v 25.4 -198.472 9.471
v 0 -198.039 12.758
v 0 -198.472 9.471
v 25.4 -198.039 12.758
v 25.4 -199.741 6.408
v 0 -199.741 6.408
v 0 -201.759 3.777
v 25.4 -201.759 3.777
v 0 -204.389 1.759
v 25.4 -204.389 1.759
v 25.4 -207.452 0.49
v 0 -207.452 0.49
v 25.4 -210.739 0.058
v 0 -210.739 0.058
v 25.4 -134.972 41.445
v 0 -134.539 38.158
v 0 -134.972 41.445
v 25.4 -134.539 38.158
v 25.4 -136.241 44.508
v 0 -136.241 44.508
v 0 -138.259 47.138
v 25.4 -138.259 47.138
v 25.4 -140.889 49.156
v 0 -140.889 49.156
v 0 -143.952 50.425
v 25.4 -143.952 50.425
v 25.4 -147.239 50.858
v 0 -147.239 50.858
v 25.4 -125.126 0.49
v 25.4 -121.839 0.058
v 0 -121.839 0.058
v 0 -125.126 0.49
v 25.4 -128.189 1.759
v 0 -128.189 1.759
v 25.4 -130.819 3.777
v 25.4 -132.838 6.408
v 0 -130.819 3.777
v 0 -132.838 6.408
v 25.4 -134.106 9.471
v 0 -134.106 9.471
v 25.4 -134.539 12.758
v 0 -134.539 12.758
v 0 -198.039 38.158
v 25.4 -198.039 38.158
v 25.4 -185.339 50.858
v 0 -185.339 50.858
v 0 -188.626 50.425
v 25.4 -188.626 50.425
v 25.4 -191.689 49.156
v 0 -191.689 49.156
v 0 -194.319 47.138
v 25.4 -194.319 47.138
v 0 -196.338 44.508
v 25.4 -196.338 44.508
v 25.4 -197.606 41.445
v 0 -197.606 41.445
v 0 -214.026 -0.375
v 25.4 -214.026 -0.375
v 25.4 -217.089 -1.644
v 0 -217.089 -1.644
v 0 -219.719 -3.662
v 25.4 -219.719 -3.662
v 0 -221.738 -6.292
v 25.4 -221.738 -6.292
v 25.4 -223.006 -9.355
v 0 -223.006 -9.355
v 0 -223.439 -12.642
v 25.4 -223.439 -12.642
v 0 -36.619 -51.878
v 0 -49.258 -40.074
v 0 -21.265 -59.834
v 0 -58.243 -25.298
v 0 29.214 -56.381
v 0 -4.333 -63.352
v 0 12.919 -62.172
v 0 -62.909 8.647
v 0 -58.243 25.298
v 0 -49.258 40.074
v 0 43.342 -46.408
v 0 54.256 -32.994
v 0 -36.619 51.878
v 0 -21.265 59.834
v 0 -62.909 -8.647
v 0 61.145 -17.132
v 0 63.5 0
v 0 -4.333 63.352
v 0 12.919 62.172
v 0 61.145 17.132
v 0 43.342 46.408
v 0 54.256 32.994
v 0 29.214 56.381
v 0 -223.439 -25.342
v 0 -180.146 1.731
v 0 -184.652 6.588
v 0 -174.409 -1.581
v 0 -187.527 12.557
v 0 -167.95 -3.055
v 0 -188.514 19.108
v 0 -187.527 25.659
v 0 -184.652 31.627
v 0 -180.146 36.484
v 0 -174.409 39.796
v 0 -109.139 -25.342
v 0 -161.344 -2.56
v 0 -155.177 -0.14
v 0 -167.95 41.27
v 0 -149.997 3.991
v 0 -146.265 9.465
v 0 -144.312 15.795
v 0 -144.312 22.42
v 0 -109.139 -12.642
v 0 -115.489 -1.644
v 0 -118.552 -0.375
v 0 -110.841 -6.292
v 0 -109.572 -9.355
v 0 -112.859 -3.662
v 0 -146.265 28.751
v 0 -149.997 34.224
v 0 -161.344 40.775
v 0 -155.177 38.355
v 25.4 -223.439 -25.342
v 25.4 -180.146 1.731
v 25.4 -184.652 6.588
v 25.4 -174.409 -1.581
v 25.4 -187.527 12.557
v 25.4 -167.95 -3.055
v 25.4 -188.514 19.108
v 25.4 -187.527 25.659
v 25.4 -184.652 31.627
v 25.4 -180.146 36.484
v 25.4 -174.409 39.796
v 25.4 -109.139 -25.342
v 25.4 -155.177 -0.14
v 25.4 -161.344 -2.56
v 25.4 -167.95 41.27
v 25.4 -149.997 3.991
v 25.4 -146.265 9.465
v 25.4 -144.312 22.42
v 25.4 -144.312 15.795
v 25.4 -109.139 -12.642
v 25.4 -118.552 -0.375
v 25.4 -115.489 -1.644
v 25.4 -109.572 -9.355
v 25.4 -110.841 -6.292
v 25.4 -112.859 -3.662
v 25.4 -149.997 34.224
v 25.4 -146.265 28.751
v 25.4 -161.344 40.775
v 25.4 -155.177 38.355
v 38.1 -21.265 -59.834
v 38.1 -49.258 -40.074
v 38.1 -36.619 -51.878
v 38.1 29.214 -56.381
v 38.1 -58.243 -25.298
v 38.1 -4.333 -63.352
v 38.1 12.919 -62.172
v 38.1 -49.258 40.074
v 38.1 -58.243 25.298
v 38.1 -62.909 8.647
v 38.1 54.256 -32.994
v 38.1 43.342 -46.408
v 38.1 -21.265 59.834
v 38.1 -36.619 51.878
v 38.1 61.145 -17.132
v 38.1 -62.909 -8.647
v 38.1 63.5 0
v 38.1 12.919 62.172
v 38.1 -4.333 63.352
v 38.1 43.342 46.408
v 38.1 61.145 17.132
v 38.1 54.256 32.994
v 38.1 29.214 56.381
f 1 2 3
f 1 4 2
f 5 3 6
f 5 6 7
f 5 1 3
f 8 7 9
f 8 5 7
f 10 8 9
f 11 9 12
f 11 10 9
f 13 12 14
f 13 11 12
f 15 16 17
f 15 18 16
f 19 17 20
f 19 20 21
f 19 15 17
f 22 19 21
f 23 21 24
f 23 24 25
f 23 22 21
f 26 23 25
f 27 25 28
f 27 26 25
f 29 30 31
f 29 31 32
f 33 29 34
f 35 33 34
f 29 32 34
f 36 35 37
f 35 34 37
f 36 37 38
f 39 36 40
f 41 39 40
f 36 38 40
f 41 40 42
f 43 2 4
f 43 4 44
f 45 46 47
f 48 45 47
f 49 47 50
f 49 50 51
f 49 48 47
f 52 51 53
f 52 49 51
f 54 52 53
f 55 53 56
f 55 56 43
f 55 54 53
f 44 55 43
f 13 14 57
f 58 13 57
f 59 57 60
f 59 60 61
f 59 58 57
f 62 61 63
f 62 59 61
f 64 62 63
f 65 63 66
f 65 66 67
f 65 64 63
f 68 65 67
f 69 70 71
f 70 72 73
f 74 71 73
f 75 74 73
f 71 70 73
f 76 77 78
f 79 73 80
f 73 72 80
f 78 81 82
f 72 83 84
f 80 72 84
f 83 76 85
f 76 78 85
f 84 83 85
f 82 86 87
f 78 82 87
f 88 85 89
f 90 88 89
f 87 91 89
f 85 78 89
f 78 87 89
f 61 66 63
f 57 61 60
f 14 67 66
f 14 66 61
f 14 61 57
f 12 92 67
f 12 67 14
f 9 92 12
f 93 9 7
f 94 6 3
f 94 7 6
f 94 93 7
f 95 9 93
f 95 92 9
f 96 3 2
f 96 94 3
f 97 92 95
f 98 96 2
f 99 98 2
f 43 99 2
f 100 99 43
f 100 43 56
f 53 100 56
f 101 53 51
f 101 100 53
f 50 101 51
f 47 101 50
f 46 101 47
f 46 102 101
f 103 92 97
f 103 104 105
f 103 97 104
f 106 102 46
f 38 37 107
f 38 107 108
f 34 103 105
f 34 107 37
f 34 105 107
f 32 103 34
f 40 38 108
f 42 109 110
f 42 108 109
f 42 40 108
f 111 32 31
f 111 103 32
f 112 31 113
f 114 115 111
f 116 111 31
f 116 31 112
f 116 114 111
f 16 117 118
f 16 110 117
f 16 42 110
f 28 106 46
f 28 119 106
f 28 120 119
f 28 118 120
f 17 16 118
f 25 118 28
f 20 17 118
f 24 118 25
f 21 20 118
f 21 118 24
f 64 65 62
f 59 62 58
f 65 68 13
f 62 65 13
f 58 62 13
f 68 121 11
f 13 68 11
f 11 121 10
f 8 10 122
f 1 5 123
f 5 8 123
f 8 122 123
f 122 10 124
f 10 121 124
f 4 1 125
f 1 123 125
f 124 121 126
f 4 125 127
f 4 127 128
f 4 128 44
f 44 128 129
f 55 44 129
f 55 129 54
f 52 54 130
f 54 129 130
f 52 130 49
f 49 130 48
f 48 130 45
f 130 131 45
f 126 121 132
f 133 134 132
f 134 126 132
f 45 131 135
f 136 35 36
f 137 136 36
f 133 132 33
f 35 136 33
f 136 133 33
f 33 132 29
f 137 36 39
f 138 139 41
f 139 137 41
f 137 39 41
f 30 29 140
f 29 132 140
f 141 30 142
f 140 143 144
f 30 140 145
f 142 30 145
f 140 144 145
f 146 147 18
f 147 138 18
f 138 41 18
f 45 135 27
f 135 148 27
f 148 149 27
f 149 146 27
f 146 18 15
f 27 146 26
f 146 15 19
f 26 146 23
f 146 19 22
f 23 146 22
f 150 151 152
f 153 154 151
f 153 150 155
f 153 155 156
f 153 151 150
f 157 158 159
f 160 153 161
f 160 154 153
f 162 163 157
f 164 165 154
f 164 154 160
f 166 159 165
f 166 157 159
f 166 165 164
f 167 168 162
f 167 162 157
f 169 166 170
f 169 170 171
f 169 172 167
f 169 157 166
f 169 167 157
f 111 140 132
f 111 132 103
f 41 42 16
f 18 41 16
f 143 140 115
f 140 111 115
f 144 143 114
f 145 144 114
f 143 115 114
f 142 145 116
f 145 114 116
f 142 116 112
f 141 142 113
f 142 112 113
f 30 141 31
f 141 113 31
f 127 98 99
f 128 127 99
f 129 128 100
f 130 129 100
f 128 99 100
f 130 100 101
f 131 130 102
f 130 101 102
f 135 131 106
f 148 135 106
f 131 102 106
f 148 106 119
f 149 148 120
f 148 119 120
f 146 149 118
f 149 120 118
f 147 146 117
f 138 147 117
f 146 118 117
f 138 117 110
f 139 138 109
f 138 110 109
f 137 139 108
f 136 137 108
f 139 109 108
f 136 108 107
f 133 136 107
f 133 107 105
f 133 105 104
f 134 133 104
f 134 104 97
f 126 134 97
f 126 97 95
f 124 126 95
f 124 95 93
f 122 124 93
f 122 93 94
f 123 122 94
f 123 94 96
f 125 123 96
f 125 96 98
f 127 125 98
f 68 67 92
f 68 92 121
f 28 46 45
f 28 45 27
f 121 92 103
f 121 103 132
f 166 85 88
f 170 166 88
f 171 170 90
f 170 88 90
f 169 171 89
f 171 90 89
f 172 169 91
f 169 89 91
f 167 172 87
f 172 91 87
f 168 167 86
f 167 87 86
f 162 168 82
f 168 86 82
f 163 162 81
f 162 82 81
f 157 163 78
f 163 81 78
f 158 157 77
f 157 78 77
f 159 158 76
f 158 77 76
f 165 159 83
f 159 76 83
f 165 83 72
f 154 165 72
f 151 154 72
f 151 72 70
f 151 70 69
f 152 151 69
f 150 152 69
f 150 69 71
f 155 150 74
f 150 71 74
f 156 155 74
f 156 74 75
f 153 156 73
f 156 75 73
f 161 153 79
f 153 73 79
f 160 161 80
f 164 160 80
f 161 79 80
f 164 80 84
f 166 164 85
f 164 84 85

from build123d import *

# Parameters (mm, degrees)
F0_R     = 63.5
F1_DEPTH = 38.1
F2_W     = 63.5
F2_H     = 76.2
F3_DEPTH = 25.4
F5_D     = 44.45
F7_W     = 25.4
F7_H     = 25.4
F8_DEPTH = 25.4
F6_W     = 25.4
F6_H     = 25.4
F9_DEPTH = 25.4
F10_R    = 12.69999


# Not quite as in the source:
# - a fillet or chamfer is up to 0.001 mm smaller than in the source, because OpenCascade refuses the exact size


with BuildPart() as f1:
    # F0 (on Right) → F1 (new body)
    with BuildSketch(Plane.YZ):
        Circle(F0_R)
    extrude(amount=F1_DEPTH)


with BuildPart() as f3:
    # F2 (on Right) → F3 (new body)
    with BuildSketch(Plane.YZ):
        with Locations((-166.2890618503, 12.7576400614)):
            Rectangle(F2_W, F2_H)
    extrude(amount=F3_DEPTH)

    # F5 (through all)
    with Locations(Plane.YZ.offset(25.4)):
        with Locations((-166.2890618503, 19.1076400614)):
            Hole(F5_D / 2)

    # F7 (on face) → F8 (join)
    with BuildSketch(Plane(origin=(0, -134.5390618503, 0), x_dir=(-1, 0, 0), z_dir=(0, 1, 0))):
        with Locations((-12.7, -12.6423599386)):
            Rectangle(F7_W, F7_H)
    extrude(amount=F8_DEPTH)

    # F6 (on face) → F9 (join)
    with BuildSketch(Plane.XZ.offset(198.0390618503)):
        with Locations((12.7, -12.6423599386)):
            Rectangle(F6_W, F6_H)
    extrude(amount=F9_DEPTH)

    # F10 (radius 12.7 in the source; OpenCascade refuses exactly that, so slightly less here)
    f10_edges = [f3.edges().sort_by_distance(p)[0] for p in [
        (12.7, -223.439062, 0.05764),
        (12.7, -198.039062, 0.05764),
        (12.7, -198.039062, 50.85764),
        (12.7, -134.539062, 50.85764),
        (12.7, -134.539062, 0.05764),
        (12.7, -109.139062, 0.05764),
    ]]
    fillet(f10_edges, radius=F10_R)


solid = Compound([f1.part, f3.part])
